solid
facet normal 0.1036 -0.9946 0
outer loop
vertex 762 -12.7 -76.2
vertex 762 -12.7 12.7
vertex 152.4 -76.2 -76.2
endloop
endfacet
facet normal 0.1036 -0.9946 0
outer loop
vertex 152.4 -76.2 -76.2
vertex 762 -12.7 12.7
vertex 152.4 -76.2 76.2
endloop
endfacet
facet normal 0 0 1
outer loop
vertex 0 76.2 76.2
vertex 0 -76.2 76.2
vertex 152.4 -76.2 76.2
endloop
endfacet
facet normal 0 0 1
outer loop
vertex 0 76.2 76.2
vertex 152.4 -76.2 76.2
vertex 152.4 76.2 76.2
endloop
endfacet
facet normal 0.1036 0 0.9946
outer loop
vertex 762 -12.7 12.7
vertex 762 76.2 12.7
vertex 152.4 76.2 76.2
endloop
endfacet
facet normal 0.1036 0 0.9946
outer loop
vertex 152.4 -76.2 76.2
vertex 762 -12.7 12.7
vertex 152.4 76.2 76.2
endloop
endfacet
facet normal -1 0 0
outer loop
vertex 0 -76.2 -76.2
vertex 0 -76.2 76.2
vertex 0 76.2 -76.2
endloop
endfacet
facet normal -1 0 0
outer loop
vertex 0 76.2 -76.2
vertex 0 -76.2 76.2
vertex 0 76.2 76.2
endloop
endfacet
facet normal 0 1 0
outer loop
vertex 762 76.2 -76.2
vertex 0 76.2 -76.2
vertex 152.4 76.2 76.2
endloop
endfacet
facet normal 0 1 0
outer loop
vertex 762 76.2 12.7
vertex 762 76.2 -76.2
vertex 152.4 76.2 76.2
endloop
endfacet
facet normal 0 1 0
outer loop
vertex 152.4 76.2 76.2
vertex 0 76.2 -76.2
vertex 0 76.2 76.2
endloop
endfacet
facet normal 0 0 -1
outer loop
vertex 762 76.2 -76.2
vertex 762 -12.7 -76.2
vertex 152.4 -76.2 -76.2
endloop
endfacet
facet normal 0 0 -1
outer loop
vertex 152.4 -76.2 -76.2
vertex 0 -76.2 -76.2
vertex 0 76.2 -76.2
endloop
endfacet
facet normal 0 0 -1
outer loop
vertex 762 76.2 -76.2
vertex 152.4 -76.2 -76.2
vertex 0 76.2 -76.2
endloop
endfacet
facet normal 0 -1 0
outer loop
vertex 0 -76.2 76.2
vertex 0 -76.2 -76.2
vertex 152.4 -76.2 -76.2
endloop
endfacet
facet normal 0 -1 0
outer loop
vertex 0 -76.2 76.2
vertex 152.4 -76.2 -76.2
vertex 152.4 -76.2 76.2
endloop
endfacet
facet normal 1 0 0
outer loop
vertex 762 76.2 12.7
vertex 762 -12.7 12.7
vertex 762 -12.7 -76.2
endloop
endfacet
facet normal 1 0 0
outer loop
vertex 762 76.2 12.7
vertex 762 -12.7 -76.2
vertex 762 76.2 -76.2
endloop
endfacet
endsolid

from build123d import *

# Parameters (mm, degrees)
F0_W     = 152.4
F0_H     = 152.4
F1_DEPTH = 762
F3_DEPTH = 152.4
F5_DEPTH = 152.4


with BuildPart() as f1:
    # F0 (on Right) → F1 (new body)
    with BuildSketch(Plane.YZ):
        Rectangle(F0_W, F0_H)
    extrude(amount=F1_DEPTH)

    # F2 (on face) → F3 (cut)
    with BuildSketch(Plane.XY.offset(76.2)):
        Polygon((762, -12.7), (152.4, -76.2), (762, -76.2), align=None)
    extrude(amount=-F3_DEPTH, mode=Mode.SUBTRACT)

    # F4 (on face) → F5 (cut)
    with BuildSketch(Plane(origin=(0, 76.2, 0), x_dir=(-1, 0, 0), z_dir=(0, 1, 0))):
        Polygon((-762, 12.7), (-152.4, 76.2), (-762, 76.2), align=None)
    extrude(amount=-F5_DEPTH, mode=Mode.SUBTRACT)


solid = f1.part
